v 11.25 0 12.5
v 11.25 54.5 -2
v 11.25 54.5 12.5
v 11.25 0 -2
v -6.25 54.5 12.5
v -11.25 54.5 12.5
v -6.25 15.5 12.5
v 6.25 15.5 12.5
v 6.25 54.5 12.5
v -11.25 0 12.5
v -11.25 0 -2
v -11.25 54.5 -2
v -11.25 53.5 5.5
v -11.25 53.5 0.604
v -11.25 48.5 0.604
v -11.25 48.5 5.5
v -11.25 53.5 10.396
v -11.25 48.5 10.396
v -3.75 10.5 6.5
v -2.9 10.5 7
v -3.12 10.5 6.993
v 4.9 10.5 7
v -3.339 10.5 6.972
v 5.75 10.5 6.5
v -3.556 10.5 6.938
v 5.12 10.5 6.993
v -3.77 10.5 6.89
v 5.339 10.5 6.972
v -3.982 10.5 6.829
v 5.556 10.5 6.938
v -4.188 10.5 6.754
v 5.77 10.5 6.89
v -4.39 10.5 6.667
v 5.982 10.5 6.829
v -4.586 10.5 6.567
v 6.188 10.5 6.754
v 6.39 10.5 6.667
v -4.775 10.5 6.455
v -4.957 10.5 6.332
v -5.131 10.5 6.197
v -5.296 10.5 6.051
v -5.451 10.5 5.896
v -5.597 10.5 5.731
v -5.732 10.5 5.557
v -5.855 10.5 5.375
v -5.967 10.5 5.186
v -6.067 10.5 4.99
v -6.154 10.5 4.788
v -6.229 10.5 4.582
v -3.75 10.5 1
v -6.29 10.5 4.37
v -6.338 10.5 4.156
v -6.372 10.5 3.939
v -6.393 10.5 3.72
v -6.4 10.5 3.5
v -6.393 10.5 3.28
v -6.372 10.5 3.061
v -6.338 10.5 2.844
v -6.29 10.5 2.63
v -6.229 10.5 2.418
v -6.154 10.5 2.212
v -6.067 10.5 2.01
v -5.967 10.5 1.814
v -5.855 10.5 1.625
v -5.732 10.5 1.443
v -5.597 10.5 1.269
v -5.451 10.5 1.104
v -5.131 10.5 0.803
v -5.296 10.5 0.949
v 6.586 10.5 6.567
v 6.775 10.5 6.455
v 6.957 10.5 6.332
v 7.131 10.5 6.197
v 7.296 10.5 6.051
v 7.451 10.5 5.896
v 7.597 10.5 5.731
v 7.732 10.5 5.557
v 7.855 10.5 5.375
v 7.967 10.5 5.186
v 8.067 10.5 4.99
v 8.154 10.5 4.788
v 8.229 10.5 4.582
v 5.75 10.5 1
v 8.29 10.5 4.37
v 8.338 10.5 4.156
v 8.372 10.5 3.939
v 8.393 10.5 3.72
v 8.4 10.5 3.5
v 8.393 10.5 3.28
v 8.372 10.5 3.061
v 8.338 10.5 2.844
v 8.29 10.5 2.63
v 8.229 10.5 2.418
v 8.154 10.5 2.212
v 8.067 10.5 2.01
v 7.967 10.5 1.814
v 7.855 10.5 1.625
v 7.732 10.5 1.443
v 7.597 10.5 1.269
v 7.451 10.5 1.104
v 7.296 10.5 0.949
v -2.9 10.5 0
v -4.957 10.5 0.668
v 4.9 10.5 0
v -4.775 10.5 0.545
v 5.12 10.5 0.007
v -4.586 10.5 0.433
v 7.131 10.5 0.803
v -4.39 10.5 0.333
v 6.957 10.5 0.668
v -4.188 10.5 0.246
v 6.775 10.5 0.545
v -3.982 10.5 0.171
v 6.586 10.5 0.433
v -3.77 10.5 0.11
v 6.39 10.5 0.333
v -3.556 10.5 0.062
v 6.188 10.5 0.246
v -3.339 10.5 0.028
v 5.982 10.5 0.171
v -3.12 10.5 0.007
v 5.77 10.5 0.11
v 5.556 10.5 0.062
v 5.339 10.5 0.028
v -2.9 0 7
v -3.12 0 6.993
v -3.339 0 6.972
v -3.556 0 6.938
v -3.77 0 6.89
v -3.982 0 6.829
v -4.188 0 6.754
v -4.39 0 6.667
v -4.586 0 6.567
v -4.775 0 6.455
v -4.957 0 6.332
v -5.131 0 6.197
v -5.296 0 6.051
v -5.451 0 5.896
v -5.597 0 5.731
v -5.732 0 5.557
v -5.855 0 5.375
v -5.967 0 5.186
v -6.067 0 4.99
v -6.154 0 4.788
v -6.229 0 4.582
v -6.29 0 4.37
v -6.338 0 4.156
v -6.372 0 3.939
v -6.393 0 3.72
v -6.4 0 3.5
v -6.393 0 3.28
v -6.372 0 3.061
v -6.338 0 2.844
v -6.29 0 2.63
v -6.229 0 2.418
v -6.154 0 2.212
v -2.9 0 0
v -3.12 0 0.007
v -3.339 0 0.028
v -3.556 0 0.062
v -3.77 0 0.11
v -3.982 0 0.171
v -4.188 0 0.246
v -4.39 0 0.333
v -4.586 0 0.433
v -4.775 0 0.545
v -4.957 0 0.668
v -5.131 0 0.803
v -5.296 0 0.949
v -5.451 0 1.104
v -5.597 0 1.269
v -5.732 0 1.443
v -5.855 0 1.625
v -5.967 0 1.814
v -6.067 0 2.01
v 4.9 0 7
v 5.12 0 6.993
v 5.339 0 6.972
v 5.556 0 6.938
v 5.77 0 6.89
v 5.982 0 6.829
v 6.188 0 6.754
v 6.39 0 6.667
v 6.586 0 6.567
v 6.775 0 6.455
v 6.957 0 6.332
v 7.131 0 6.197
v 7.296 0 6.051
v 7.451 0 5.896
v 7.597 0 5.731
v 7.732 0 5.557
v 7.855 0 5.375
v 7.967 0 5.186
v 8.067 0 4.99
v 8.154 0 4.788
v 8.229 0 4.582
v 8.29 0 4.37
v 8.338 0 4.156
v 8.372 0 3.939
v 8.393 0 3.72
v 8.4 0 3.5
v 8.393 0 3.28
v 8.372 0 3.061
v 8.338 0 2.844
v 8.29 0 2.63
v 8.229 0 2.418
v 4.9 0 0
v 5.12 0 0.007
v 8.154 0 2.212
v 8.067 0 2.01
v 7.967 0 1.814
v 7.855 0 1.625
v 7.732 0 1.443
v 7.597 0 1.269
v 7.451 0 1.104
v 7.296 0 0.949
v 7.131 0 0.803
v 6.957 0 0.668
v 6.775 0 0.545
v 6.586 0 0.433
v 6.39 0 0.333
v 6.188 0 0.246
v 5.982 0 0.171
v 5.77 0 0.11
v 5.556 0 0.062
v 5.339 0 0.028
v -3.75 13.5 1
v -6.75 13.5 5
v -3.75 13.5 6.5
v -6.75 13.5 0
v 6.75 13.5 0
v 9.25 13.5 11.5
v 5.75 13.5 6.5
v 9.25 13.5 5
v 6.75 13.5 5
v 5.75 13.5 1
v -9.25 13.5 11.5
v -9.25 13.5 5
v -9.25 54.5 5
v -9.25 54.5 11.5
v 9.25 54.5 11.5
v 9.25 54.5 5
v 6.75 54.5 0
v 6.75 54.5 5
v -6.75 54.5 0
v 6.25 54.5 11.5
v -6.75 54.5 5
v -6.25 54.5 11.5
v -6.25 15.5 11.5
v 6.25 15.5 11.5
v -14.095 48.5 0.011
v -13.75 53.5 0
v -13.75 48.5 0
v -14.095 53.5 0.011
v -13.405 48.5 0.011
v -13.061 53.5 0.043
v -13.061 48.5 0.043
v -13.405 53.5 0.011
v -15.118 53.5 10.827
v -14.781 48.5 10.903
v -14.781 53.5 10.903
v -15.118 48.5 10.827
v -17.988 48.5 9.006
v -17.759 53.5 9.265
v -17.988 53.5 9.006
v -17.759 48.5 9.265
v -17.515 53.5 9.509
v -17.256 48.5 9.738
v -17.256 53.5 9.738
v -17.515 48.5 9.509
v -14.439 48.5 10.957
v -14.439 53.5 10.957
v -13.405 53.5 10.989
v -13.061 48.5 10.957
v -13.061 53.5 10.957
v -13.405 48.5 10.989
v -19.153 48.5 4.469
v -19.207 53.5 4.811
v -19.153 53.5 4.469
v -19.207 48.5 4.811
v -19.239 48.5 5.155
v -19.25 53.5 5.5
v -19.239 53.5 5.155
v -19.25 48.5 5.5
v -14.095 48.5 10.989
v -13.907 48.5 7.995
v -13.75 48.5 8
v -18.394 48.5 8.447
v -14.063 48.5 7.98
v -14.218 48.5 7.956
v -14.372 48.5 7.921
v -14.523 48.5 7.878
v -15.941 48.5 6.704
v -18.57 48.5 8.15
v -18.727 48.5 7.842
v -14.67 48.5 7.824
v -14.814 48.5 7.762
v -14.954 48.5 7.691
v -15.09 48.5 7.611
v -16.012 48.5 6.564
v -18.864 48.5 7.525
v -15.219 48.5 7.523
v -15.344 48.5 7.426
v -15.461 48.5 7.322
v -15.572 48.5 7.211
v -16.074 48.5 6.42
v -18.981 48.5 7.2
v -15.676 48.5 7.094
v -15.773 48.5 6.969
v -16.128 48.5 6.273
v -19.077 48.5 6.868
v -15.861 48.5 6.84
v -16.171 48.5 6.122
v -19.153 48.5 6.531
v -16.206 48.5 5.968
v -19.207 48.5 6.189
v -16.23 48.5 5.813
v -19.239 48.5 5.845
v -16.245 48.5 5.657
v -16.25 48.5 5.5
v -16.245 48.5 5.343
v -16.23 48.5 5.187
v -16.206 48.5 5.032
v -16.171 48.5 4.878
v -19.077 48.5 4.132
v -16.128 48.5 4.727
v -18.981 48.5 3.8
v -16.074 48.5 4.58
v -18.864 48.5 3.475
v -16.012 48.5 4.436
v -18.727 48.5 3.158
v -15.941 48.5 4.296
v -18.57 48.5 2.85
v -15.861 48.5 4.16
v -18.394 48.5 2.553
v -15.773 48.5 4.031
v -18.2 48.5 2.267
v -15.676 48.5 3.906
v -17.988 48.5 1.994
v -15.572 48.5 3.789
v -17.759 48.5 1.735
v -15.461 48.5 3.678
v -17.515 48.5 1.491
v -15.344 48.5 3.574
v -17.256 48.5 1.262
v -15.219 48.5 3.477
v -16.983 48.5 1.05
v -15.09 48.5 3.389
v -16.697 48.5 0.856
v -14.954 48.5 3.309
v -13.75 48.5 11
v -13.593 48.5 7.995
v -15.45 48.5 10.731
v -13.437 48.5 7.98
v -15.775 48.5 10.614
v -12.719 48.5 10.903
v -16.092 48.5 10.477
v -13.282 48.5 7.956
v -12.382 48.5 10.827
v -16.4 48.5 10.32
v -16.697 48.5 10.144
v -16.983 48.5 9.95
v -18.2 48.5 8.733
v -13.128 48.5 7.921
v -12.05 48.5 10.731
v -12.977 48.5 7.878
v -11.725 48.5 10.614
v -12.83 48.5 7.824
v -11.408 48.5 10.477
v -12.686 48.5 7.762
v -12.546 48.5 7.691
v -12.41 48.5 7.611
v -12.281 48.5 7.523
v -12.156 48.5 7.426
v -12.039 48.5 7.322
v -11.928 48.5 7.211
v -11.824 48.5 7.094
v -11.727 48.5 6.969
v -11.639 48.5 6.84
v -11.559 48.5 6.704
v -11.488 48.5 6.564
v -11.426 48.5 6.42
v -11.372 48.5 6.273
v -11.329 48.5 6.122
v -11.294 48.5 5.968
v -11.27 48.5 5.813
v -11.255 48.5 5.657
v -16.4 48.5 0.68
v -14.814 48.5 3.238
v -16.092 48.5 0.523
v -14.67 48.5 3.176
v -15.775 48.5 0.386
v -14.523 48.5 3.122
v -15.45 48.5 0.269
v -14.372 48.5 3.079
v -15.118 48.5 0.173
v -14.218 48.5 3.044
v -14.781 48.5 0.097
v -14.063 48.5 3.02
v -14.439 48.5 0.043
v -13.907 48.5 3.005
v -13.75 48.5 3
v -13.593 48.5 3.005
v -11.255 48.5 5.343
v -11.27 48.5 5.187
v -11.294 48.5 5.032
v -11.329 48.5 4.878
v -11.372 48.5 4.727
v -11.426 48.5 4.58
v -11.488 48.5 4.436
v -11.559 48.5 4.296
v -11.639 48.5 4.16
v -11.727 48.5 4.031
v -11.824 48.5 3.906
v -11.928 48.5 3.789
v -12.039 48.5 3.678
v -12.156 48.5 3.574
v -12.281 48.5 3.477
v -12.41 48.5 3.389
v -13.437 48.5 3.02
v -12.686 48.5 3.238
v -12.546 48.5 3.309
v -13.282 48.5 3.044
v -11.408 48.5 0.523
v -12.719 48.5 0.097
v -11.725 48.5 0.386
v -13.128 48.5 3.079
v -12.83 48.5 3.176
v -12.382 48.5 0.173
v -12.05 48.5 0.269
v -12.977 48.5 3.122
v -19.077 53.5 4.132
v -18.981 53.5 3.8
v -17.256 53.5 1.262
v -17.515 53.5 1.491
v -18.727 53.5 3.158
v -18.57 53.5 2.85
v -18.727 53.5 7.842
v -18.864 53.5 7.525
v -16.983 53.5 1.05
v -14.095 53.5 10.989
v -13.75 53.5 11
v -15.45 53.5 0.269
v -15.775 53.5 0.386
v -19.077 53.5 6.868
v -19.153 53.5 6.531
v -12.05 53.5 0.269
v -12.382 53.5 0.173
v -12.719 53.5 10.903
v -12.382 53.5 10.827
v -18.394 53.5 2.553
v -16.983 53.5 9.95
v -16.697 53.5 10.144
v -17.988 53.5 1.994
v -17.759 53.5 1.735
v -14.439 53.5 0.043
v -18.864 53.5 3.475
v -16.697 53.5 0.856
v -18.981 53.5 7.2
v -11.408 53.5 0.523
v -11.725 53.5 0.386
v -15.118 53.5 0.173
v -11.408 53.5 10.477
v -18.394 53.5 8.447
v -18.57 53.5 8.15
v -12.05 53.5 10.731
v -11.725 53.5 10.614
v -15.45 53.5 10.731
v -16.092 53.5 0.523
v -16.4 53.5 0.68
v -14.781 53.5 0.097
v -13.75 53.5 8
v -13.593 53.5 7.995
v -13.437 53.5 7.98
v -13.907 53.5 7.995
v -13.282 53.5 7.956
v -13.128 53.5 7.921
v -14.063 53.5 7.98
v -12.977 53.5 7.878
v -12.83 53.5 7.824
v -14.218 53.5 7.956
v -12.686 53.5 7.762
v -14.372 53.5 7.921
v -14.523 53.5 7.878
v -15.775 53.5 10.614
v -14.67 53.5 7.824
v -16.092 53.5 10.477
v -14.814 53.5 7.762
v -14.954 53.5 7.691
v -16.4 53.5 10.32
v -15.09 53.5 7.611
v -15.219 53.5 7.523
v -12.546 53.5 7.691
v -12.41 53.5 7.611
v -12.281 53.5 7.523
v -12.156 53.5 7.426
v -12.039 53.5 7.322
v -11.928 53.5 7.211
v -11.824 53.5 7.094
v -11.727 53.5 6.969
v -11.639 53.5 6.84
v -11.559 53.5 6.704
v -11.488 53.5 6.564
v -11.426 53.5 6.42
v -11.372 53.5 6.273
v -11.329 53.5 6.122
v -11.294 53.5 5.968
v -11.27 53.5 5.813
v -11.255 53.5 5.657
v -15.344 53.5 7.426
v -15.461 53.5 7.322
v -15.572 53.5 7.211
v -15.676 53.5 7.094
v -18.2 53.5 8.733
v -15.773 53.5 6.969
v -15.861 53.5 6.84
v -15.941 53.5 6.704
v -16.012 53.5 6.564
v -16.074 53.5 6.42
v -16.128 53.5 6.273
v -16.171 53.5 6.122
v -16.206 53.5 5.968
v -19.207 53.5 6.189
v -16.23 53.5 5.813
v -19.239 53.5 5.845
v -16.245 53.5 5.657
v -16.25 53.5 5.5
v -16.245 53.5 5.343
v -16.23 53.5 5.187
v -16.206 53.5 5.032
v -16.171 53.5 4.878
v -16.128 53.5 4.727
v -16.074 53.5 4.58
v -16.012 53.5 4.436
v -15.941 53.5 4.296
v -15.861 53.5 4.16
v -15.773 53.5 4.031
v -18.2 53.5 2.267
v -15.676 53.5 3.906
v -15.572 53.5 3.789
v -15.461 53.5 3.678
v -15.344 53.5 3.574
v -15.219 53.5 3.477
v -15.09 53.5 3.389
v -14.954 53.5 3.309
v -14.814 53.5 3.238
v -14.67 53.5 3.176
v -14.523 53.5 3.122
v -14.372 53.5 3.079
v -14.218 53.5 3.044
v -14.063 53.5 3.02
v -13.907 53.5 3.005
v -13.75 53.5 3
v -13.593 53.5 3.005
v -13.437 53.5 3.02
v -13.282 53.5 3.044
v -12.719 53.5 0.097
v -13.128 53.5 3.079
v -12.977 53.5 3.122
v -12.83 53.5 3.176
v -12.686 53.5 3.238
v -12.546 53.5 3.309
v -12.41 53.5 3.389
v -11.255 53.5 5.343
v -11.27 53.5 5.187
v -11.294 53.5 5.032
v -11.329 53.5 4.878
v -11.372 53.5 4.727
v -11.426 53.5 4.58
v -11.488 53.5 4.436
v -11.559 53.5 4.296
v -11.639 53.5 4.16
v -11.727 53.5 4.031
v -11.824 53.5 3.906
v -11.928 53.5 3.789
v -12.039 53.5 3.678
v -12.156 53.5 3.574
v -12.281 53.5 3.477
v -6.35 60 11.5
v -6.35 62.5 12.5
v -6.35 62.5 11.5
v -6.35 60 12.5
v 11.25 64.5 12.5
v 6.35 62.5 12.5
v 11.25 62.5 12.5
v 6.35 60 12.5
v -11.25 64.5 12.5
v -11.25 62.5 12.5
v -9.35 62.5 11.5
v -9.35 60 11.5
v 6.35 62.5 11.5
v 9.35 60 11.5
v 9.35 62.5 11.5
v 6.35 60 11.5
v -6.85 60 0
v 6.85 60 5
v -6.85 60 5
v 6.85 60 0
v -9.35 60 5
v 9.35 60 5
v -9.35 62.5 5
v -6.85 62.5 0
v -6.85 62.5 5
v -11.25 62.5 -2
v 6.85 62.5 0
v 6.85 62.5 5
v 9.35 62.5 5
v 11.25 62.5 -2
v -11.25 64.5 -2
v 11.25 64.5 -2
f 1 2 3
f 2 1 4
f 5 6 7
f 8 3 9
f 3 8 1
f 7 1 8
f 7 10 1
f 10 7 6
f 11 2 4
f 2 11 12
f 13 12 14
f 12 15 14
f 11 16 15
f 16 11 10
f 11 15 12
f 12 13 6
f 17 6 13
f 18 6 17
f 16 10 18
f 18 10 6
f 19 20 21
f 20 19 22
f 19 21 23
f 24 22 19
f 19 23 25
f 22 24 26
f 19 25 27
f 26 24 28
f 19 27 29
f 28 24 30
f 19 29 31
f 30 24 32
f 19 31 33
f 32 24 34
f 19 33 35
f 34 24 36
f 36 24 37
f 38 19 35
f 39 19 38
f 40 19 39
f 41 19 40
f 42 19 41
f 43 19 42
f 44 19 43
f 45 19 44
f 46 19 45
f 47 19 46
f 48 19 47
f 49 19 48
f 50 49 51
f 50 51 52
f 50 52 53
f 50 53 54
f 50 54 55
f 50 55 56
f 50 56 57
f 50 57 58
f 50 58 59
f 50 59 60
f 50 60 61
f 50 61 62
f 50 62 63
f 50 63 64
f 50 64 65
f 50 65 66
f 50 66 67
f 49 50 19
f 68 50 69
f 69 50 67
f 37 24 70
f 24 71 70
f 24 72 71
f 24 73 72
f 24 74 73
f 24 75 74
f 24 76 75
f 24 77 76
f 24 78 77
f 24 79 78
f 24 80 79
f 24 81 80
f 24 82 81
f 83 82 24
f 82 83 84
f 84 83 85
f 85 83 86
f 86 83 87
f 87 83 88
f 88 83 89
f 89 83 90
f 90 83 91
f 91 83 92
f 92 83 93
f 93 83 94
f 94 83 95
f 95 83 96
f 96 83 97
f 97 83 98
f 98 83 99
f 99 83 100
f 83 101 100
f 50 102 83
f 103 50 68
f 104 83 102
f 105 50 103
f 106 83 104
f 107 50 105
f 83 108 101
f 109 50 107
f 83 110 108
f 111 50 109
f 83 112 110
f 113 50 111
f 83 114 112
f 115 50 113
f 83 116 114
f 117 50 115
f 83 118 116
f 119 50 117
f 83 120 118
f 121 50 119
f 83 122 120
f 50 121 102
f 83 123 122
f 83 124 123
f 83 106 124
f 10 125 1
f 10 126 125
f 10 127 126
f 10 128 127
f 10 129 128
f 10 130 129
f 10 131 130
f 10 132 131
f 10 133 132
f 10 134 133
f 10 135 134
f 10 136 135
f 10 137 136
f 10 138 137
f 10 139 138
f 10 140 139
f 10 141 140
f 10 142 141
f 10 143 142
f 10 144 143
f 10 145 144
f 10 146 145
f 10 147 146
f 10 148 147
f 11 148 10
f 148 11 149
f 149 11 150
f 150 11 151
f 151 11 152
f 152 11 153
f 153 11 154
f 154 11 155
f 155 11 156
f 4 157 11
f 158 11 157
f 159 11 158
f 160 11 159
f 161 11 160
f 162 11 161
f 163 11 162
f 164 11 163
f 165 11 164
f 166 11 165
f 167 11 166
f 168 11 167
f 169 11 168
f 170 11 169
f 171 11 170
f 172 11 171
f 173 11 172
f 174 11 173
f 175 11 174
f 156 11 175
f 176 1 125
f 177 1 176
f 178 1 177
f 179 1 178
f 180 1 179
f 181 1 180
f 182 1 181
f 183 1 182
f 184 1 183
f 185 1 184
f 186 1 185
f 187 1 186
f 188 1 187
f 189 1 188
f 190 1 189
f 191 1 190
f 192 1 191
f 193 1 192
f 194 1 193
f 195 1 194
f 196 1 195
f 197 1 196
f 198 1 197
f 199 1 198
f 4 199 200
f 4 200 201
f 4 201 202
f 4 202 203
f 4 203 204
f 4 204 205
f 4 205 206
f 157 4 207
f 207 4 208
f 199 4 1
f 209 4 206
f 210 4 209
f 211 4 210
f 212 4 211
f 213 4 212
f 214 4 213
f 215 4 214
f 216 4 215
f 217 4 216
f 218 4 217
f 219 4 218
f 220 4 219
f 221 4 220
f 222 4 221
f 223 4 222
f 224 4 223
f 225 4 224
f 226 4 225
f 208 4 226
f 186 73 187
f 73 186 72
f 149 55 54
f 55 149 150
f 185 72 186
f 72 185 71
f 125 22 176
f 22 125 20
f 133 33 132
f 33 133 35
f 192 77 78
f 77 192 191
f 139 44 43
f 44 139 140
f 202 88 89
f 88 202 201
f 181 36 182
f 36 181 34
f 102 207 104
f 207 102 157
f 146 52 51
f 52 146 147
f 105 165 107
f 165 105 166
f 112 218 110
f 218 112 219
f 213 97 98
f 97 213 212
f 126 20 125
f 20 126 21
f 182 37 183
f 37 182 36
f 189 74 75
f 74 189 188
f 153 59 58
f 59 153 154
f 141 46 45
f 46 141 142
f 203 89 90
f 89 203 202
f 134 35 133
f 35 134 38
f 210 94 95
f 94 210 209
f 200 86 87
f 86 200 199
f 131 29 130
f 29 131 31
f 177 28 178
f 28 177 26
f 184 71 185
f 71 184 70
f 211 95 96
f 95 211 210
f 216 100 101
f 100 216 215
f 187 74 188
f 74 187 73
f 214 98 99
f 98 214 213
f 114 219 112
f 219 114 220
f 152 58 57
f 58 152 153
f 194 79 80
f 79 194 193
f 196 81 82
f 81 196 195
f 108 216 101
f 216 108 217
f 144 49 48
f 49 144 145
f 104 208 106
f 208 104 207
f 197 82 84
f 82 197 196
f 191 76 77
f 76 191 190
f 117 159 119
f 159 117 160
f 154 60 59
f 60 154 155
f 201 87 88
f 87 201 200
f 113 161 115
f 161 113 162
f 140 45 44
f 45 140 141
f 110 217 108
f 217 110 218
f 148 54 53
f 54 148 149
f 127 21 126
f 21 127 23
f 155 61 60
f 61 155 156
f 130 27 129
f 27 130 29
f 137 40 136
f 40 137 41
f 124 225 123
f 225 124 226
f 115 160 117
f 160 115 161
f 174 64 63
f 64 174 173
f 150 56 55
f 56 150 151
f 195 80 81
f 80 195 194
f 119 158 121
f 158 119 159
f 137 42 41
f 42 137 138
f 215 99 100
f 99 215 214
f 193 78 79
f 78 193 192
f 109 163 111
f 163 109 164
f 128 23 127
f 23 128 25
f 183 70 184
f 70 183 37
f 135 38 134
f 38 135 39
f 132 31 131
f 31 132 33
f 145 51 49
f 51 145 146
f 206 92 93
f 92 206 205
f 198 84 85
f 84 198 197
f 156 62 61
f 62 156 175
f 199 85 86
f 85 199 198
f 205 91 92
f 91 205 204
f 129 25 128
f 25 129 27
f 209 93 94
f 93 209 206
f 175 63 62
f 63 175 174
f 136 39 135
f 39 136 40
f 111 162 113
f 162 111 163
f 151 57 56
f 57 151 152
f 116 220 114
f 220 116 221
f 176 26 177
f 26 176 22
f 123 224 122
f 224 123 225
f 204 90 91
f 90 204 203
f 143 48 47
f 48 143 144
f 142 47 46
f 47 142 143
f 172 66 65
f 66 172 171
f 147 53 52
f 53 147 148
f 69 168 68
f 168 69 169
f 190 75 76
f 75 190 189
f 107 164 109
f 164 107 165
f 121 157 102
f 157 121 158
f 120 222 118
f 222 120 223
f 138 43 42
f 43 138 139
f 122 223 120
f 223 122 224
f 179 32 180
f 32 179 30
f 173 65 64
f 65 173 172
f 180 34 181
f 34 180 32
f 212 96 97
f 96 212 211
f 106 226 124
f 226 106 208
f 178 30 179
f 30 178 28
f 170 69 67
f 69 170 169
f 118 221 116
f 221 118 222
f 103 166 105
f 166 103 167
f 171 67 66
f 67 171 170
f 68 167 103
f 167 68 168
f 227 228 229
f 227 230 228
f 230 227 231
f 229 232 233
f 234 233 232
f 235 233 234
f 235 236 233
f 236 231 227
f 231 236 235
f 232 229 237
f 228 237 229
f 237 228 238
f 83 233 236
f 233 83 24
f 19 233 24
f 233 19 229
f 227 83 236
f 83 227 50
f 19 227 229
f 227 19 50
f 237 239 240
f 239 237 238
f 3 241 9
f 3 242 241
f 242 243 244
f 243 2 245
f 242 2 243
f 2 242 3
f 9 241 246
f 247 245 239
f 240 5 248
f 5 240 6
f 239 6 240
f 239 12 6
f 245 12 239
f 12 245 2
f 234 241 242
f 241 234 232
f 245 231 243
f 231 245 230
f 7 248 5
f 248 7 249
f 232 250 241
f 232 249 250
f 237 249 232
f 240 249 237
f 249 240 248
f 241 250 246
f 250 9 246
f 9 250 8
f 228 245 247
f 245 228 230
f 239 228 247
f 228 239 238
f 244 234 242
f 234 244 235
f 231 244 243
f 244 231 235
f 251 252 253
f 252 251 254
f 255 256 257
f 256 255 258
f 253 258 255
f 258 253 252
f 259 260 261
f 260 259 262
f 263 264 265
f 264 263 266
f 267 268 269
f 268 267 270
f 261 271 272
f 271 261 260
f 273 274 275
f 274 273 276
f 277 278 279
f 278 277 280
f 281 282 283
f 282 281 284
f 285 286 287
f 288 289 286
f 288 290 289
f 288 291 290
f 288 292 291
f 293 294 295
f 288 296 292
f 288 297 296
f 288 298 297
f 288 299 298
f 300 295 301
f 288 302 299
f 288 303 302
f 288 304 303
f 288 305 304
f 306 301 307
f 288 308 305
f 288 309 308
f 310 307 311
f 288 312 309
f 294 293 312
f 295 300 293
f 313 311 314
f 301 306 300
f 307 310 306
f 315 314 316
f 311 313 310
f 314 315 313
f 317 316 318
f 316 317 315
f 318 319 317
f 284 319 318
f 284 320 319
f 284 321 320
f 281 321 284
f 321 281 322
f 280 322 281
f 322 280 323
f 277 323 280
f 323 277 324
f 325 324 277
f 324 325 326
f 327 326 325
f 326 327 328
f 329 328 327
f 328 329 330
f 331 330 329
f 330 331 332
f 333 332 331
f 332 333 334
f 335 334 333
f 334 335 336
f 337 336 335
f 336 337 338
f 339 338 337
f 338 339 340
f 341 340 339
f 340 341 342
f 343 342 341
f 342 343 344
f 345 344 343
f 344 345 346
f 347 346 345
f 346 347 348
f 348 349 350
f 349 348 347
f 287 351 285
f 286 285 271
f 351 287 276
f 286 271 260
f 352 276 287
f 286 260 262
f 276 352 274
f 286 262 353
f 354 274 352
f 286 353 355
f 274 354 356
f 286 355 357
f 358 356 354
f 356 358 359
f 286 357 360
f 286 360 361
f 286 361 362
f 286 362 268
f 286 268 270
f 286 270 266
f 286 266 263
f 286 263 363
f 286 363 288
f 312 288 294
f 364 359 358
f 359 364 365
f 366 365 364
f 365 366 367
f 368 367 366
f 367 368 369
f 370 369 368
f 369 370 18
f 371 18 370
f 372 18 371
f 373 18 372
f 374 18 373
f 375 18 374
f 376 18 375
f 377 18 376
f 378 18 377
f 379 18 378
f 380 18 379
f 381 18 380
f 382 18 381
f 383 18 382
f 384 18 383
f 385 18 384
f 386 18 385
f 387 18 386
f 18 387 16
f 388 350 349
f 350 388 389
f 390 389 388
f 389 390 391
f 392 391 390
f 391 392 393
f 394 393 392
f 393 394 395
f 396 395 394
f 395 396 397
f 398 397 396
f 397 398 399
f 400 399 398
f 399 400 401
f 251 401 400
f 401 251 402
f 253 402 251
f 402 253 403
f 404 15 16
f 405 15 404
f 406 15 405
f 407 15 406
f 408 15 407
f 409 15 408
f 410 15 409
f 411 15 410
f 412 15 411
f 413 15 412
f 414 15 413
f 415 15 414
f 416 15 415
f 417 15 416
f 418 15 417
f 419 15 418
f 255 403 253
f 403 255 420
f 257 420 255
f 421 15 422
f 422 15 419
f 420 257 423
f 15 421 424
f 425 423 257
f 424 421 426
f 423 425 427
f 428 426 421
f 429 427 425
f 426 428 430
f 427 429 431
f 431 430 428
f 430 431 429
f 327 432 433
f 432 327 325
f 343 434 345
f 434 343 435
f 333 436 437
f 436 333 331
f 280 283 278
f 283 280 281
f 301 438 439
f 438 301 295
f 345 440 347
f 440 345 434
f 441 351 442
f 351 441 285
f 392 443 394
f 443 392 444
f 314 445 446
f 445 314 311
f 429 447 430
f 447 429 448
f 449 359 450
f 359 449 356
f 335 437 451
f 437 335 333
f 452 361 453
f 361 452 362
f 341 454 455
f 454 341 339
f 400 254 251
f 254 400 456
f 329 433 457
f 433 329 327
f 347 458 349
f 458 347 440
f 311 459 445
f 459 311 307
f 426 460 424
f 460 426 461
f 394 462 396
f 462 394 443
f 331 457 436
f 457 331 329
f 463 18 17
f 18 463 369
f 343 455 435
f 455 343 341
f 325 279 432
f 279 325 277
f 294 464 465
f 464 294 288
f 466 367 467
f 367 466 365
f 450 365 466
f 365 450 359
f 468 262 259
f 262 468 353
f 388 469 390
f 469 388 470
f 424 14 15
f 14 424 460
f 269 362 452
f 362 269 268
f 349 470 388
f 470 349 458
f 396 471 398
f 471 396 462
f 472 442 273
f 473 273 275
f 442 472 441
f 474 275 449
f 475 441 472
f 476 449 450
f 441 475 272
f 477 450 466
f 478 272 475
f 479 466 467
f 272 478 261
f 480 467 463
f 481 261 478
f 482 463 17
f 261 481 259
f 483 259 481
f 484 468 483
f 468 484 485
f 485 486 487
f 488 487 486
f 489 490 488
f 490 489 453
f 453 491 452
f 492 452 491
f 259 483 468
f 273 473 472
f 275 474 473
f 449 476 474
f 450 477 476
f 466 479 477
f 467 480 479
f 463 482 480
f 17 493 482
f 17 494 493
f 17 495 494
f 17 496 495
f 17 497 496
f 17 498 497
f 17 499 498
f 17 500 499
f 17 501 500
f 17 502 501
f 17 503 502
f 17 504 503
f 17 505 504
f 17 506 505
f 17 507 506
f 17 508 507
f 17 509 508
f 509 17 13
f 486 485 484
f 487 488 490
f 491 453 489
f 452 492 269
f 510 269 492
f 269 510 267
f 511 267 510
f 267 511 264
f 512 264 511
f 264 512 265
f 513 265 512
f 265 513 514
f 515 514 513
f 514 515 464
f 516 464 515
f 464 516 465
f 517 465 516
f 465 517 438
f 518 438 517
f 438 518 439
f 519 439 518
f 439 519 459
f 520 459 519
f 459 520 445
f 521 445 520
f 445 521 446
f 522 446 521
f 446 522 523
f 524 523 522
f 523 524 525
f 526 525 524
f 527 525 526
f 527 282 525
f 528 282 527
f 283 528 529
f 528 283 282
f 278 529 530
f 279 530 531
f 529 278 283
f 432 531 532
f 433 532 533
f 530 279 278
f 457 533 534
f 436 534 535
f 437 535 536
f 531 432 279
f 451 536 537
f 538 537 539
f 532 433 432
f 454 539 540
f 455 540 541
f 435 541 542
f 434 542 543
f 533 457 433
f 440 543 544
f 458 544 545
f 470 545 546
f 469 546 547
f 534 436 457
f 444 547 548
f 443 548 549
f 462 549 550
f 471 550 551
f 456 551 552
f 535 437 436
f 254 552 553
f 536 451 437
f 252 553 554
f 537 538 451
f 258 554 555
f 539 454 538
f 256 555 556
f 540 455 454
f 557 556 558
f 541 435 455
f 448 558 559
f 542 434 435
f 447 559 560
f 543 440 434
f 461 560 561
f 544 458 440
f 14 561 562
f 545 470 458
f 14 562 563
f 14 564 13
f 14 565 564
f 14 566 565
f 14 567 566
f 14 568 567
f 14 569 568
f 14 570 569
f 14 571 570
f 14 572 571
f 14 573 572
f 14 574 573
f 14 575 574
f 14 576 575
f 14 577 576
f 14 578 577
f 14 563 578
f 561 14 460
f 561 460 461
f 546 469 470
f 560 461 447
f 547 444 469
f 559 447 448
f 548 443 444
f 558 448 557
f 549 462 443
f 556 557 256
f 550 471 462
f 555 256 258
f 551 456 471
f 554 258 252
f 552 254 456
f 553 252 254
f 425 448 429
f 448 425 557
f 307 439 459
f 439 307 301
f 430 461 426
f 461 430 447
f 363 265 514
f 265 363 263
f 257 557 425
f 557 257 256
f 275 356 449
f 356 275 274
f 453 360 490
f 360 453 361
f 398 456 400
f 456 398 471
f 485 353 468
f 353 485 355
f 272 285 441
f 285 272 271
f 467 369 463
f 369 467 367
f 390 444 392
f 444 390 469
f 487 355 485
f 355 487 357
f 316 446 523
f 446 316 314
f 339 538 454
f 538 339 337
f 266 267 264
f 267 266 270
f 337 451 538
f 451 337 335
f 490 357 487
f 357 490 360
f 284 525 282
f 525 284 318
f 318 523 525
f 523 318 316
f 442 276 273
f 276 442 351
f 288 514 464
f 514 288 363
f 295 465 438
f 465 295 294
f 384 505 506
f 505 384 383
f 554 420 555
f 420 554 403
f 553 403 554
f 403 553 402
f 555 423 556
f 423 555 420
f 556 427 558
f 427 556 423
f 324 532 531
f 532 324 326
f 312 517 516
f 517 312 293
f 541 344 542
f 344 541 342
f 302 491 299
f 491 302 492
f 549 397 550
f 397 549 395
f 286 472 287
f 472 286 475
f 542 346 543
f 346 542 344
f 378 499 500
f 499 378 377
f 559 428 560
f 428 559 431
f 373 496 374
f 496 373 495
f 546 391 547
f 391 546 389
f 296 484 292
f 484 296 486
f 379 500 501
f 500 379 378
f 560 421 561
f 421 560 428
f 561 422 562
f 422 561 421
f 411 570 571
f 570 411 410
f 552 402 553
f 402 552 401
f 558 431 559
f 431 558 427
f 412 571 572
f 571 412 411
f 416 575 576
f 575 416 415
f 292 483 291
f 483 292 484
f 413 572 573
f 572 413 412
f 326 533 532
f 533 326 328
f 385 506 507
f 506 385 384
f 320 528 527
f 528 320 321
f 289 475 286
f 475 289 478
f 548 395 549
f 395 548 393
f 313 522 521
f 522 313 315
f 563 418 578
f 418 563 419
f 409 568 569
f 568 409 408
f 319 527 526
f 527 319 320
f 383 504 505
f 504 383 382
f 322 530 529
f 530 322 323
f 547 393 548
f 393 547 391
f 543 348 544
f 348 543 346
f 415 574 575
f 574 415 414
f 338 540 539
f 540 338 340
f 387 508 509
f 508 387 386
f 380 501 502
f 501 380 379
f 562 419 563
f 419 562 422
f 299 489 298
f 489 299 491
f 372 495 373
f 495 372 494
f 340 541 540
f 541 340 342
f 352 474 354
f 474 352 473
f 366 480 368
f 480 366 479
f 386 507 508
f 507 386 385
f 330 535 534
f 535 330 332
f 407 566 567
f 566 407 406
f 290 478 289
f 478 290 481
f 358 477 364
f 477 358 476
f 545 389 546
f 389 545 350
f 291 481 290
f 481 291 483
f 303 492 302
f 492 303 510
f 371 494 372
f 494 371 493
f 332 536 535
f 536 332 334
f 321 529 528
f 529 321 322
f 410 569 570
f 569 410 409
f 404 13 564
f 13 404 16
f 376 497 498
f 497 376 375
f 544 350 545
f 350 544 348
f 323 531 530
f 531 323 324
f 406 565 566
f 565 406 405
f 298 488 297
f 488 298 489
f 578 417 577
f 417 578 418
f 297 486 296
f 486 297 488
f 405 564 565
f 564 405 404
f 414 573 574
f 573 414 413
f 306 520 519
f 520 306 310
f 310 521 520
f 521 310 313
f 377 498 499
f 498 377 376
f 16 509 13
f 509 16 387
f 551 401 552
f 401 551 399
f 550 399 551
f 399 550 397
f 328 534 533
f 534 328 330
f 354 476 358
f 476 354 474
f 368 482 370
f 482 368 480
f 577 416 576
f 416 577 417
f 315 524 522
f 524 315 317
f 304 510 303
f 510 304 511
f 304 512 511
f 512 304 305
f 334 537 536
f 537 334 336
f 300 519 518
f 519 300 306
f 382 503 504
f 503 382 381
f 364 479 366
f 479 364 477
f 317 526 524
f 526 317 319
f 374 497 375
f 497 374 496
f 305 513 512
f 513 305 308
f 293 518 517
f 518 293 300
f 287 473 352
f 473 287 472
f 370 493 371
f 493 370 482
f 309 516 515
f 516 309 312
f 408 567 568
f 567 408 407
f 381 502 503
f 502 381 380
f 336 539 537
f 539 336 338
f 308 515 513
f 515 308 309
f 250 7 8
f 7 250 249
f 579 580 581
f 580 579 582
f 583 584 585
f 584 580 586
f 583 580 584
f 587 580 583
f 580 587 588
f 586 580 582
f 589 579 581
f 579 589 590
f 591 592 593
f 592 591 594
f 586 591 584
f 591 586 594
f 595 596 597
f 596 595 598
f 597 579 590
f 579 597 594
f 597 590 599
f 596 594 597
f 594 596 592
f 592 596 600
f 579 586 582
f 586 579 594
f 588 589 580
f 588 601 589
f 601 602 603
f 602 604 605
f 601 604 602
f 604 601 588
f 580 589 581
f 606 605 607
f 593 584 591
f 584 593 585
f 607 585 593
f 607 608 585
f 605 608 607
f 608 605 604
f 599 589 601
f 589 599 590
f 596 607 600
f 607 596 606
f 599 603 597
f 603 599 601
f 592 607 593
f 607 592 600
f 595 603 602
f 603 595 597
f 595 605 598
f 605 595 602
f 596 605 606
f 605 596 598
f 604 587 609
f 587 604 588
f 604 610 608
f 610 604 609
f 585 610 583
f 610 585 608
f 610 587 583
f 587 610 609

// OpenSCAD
// Kombiniertes Modell: Röhre mit Deckel und Haken
// Steuerungsvariablen für die Anzeige
show_case = true;        // Case ein-/ausblenden
show_cover = true;       // Deckel ein-/ausblenden
show_hook = true;        // Haken ein-/ausblenden
cover_y_offset = 10;     // Y-Verschiebung des Deckels (0 = genau über der Öffnung, positiv = nach hinten)
cover_thickening = 0.2;  // Verdickungsfaktor für die Wandstärke im Deckel (0 = exakte Passung, >0 = Presspassung)
cover_color = "yellow";  // Farbe für den Deckeleinsatz (Erhöhung)
hook_color = "blue";     // Farbe für den Haken

// Nur die Breiten der drei Rechtecke können angepasst werden
// Die anderen Maße bleiben wie im Original
press_fit = 0.2;
top_rect_width = press_fit + 12.5;    // Standardwert: 12.5
middle_rect_width = press_fit + 18.5; // Standardwert: 18.5
bottom_rect_width = press_fit + 13.5; // Standardwert: 13.5

// Steuerungsvariablen für den Verbindungssteg
show_bridge = true;      // Verbindungssteg ein-/ausblenden
bridge_y_position = 0;   // Position des Stegs in Y-Richtung (vom Beginn des hinteren Quaders)
bridge_width = 2;        // Breite des Verbindungsstegs in mm
bridge_color = "red";    // Farbe des Verbindungsstegs

// Farbeinstellungen für die Teile
thickening_color = "green";  // Farbe der Verdickungen (Übergangsbereich hinter dem Oval)

// Parameter
inner_oval_width = 14.8;  // Gesamte innere Breite des Ovals (original)
inner_height = 7;        // Innere Höhe
inner_radius = inner_height / 2; // Radius für die Rundungen = 3.5mm

// Korrektur der Geometrie für das Oval
inner_straight = inner_oval_width - (2 * inner_radius); // = 7,8mm

// Tiefe und Wandstärke
depth = 10.5;            // Tiefe der Röhre (Basis)
wall_thickness = 2;      // Grundlegende Wandstärke

// Äußere Dimensionen für das gesamte Objekt
outer_total_width = 22.5;  // Gesamtbreite außen (angepasst für 18,5mm Innenabstand im oberen Teil)
outer_height = 14.5;     // Gesamthöhe des Objekts

// Parameter für den hinteren Quader
rear_box_length = 44;    // Länge des hinteren Quaders (entlang Y-Achse)
rear_box_wall = 2;       // Wandstärke des hinteren Quaders
rear_inner_width = 18.5; // Innere Breite des hinteren Quaders
sidewall_y_extension = 3.5; // Verlängerung der Seitenwände in Y-Richtung (nach hinten)

// Parameter für die Verdickung
thickening_length = 3;    // Länge der Verdickung
thickening_thickness_left = 5.5;  // Dicke der Verdickung an der linken Seite
thickening_thickness_right = 7.5; // Dicke der Verdickung an der rechten Seite
thickening_thickness_top = 6;   // Dicke der Verdickung oben
thickening_thickness_bottom = 3; // Dicke der Verdickung unten

// Parameter für die seitlichen Verdickungen
side_thickening_x = 2.5;  // Breite (Dicke) der Seitenverdickung
side_thickening_y = 7;    // Höhe der Seitenverdickung (in Z-Richtung)

// Parameter für die zusätzlichen Verdickungen auf den verlängerten Seitenwänden
extension_thickening_width = rear_box_wall + 3;   // Breite/Stärke der Verdickung (Seitenwandstärke + 2mm)
extension_thickening_depth = 1;   // Tiefe (wie weit sie in den Hohlraum ragt)
extension_thickening_height = rear_box_length - thickening_length; // Höhe (gleich wie Seitenwände)

// Parameter für den Verbindungssteg
bridge_height = extension_thickening_depth; // Höhe des Stegs (gleich wie Verdickungen)

// Positionierung der ovalen Öffnung
oval_x_offset = 1;    // Horizontale Verschiebung der ovalen Öffnung (+ nach rechts, - nach links)

// Berechnung für die neue Position (Bodenplatte bei Z=0)
z_offset = outer_height/2 - wall_thickness; // = 6.25mm Verschiebung nach oben

// Parameter für den Deckel
cover_thickness = 2;     // Stärke des Grunddeckels
insert_depth = 2.5;        // Tiefe/Höhe des Einsatzes

// Parameter für den Haken
inner_diameter = 5;      // Innendurchmesser des Hakens in mm
hook_wall_thickness = 3; // Wandstärke des Hakens in mm
hook_height = 5;         // Höhe des Hakens in mm
hook_cut_position_y = 3; // Position des Schnitts für den Haken
hook_position_x = -2.5;     // Zusätzliche X-Verschiebung des Hakens (positiv = nach außen, negativ = nach innen)
hook_position_y = 40;    // Position des Hakens in Y-Richtung auf der Seitenwand
hook_position_z = 7.5;     // Position des Hakens in Z-Richtung auf der Seitenwand
hook_rotation = 90;      // Zusätzliche Rotation des Hakens um die X-Achse (0-360 Grad)

// Abgerundetes Rechteck mit konstantem Mittelteil (für den Innenraum)
module rounded_rect(total_width, height, center_distance, radius) {
    hull() {
        // Linker Kreis
        translate([-(center_distance/2), 0, 0])
            circle(r = radius, $fn=100);
        
        // Rechter Kreis
        translate([center_distance/2, 0, 0])
            circle(r = radius, $fn=100);
    }
}

// Modul für das Case (Röhre mit hinterem Quader)
module case_model() {
    // Gesamtes Modell in neuer Ausrichtung - Boden in X-Y-Ebene bei Z=0
    union() {
        // BASIS MIT OVALEM HOHLRAUM - vorderer Teil mit ovaler Öffnung
        // Nach oben verschoben, sodass die Bodenplatte bei Z=0 beginnt
        translate([0, 0, z_offset]) {
            difference() {
                // Äußerer Quader (rechteckig)
                translate([0, depth/2, 0])
                    cube([outer_total_width, depth, outer_height], center=true);
                
                // Inneres abgerundetes Rechteck (wird abgezogen) - mit Original-Maßen
                // Die ovale Öffnung kann über oval_x_offset horizontal verschoben werden
                translate([oval_x_offset, depth + 0.1, -1.75])
                    rotate([90, 0, 0])  // Drehen nur für die Extrusion - nicht das fertige Objekt
                    linear_extrude(height=depth + 0.2)
                        translate([0, 0, 0])
                        rounded_rect(inner_oval_width, inner_height, inner_straight, inner_radius);
            }
        }
        
        // ÜBERGANGSBEREICH MIT VERDICKUNG - zwischen vorderem und hinterem Teil
        translate([0, 0, z_offset]) {
            translate([0, depth, 0]) {
                color(thickening_color) {
                    difference() {
                        // Äußerer Quader der Verdickung
                        translate([0, thickening_length/2, 0])
                            cube([outer_total_width, thickening_length, outer_height], center=true);
                            
                        // Berechnen der Verschiebung für einen asymmetrischen inneren Hohlraum
                        x_offset = (thickening_thickness_right - thickening_thickness_left) / 2;
                        inner_width = outer_total_width - (thickening_thickness_left + thickening_thickness_right);
                            
                        // Innerer Quader mit asymmetrischer Position (individuelle Wandstärken links/rechts)
                        translate([x_offset, thickening_length/2, (thickening_thickness_bottom - thickening_thickness_top) / 2])
                            cube([inner_width, 
                                thickening_length + 0.2, 
                                outer_height - (thickening_thickness_top + thickening_thickness_bottom)], center=true);
                    }
                }
            }
        }
        
        // HINTERER QUADER (nach hinten offener Teil) - in Y-Richtung
        translate([0, 0, z_offset]) {
            translate([0, depth + thickening_length, 0]) {
                // Linker Seitenteil mit Verlängerung nach hinten
                translate([-outer_total_width/2, 0, -outer_height/2]) {
                    // Hauptteil
                    cube([rear_box_wall, rear_box_length - thickening_length, outer_height]);
                }
                
                // Rechter Seitenteil mit Verlängerung nach hinten
                translate([outer_total_width/2 - rear_box_wall, 0, -outer_height/2]) {
                    // Hauptteil
                    cube([rear_box_wall, rear_box_length - thickening_length, outer_height]);
                }
                
                // Unterer Teil (geschlossene Querseite, am Boden)
                translate([-outer_total_width/2, 0, -outer_height/2])
                    cube([outer_total_width, rear_box_length - thickening_length, rear_box_wall]);
                
                // Verdickungen auf den verlängerten Seitenwänden (seitlich)
                // Linke Verdickung
                translate([-outer_total_width/2, 0, outer_height/2 - extension_thickening_depth])
                    cube([extension_thickening_width, extension_thickening_height, extension_thickening_depth]);
                
                // Rechte Verdickung
                translate([outer_total_width/2 - extension_thickening_width, 0, outer_height/2 - extension_thickening_depth])
                    cube([extension_thickening_width, extension_thickening_height, extension_thickening_depth]);
            }
        }
        
        // SEITLICHE VERDICKUNGEN - in Y-Z-Richtung entlang des hinteren Quaders
        translate([0, 0, z_offset]) {
            translate([0, depth + thickening_length, 0]) {
                // Linke Seitliche Verdickung
                translate([
                    -rear_inner_width/2,                   // X-Position: linke Innenwand
                    0,                                     // Y-Position: Anfang des hinteren Quaders
                    -outer_height/2                        // Z-Position: DIREKT am Boden
                ])
                cube([side_thickening_x, rear_box_length - thickening_length, side_thickening_y]);
                
                // Rechte Seitliche Verdickung
                translate([
                    rear_inner_width/2 - side_thickening_x, // X-Position: rechte Innenwand
                    0,                                      // Y-Position: Anfang des hinteren Quaders
                    -outer_height/2                         // Z-Position: DIREKT am Boden
                ])
                cube([side_thickening_x, rear_box_length - thickening_length, side_thickening_y]);
            }
        }
    }
}

// Modul für den Verbindungssteg zwischen den oberen Verdickungen
module bridge_model() {
    // Position berechnen, um den Steg zwischen den beiden oberen Verdickungen zu platzieren
    translate([0, depth + thickening_length + bridge_y_position, z_offset]) {
        // Farbzuweisung für den Steg
        color(bridge_color) {
            // Steg, der die beiden oberen Verdickungen verbindet
            translate([
                -outer_total_width/2 + extension_thickening_width,  // X-Position: Beginnt am Ende der linken Verdickung
                0,                                                  // Y-Position: An der angegebenen Position
                outer_height/2 - bridge_height                      // Z-Position: Auf gleicher Höhe wie die Verdickungen
            ])
            // Breite = Gesamtbreite - (2 * Breite der Verdickungen) + minimale Überlappung
            cube([
                outer_total_width - 2 * extension_thickening_width,  // X-Größe: Abstand zwischen den Verdickungen
                bridge_width,                                        // Y-Größe: Breite des Stegs gemäß Einstellung
                bridge_height                                        // Z-Größe: Höhe des Stegs
            ]);
        }
    }
}

// Modul für den Deckel mit drei Rechtecken
module cover_model() {
    // Basis-Deckelplatte
    cube([outer_total_width, cover_thickness, outer_height]);
    
    // Drei einfache Rechtecke für die Verdickung mit symmetrisch berechneten Positionen
    translate([0, cover_thickness, 0]) {
        color(cover_color) {
            // Oberes Rechteck - symmetrisch positioniert
            translate([(outer_total_width - top_rect_width)/2, 0, outer_height - extension_thickening_depth])
                cube([top_rect_width, insert_depth, extension_thickening_depth]);
            
            // Mittleres Rechteck - symmetrisch positioniert
            translate([(outer_total_width - middle_rect_width)/2, 0, side_thickening_y])
                cube([middle_rect_width, insert_depth, outer_height - side_thickening_y - extension_thickening_depth]);
            
            // Unteres Rechteck - symmetrisch positioniert
            translate([(outer_total_width - bottom_rect_width)/2, 0, rear_box_wall])
                cube([bottom_rect_width, insert_depth, side_thickening_y - rear_box_wall]);
        }
    }
}

// Modul für den Haken
module hook_model() {
    outer_diameter = inner_diameter + (hook_wall_thickness * 2);
    
    color(hook_color) {
        // Zylinder mit variablem Schnitt
        intersection() {
            // Hohler Zylinder
            difference() {
                cylinder(h = hook_height, d = outer_diameter, $fn = 100);
                
                translate([0, 0, -1])
                    cylinder(h = hook_height + 2, d = inner_diameter, $fn = 100);
            }
            
            // Schnittebene mit variabler Position in Y-Richtung
            translate([-outer_diameter/2, -outer_diameter + hook_cut_position_y, 0])
                cube([outer_diameter, outer_diameter, hook_height]);
        }
    }
}

// Hauptmodell - Zusammenstellung basierend auf den Steuerungsvariablen
if (show_case) {
    case_model();
    
    // Steg wird nur angezeigt, wenn auch das Case angezeigt wird
    if (show_bridge) {
        bridge_model();
    }
    
    // Haken wird nur angezeigt, wenn er aktiviert ist und das Case angezeigt wird
    if (show_hook) {
        // Platziere den Haken an der linken Seitenwand
        translate([
            -outer_total_width/2 + hook_position_x,   // X-Position: an der linken Außenwand mit Offset
            depth + thickening_length + hook_position_y, // Y-Position: bestimmte Position auf der Seitenwand
            z_offset - outer_height/2 + hook_position_z  // Z-Position: bestimmte Höhe an der Seitenwand
        ]) {
            rotate([hook_rotation, 90, 0]) {  // Drehe den Haken, sodass er horizontal nach außen zeigt und die Rundung nach außen
                hook_model();
            }
        }
    }
}

if (show_cover) {
    // Einfache und direkte Positionierung des Deckels
    total_case_length = depth + thickening_length + (rear_box_length - thickening_length);
    
    // Platziere den Deckel präzise und automatisch zentriert
    // Der Wert outer_total_width wird direkt verwendet für korrekte Zentrierung
    translate([outer_total_width, total_case_length + cover_y_offset, z_offset]) {
        translate([-outer_total_width/2, 0, -outer_height/2]) {
            rotate([0, 0, 180]) {
                cover_model();
            }
        }
    }
}
